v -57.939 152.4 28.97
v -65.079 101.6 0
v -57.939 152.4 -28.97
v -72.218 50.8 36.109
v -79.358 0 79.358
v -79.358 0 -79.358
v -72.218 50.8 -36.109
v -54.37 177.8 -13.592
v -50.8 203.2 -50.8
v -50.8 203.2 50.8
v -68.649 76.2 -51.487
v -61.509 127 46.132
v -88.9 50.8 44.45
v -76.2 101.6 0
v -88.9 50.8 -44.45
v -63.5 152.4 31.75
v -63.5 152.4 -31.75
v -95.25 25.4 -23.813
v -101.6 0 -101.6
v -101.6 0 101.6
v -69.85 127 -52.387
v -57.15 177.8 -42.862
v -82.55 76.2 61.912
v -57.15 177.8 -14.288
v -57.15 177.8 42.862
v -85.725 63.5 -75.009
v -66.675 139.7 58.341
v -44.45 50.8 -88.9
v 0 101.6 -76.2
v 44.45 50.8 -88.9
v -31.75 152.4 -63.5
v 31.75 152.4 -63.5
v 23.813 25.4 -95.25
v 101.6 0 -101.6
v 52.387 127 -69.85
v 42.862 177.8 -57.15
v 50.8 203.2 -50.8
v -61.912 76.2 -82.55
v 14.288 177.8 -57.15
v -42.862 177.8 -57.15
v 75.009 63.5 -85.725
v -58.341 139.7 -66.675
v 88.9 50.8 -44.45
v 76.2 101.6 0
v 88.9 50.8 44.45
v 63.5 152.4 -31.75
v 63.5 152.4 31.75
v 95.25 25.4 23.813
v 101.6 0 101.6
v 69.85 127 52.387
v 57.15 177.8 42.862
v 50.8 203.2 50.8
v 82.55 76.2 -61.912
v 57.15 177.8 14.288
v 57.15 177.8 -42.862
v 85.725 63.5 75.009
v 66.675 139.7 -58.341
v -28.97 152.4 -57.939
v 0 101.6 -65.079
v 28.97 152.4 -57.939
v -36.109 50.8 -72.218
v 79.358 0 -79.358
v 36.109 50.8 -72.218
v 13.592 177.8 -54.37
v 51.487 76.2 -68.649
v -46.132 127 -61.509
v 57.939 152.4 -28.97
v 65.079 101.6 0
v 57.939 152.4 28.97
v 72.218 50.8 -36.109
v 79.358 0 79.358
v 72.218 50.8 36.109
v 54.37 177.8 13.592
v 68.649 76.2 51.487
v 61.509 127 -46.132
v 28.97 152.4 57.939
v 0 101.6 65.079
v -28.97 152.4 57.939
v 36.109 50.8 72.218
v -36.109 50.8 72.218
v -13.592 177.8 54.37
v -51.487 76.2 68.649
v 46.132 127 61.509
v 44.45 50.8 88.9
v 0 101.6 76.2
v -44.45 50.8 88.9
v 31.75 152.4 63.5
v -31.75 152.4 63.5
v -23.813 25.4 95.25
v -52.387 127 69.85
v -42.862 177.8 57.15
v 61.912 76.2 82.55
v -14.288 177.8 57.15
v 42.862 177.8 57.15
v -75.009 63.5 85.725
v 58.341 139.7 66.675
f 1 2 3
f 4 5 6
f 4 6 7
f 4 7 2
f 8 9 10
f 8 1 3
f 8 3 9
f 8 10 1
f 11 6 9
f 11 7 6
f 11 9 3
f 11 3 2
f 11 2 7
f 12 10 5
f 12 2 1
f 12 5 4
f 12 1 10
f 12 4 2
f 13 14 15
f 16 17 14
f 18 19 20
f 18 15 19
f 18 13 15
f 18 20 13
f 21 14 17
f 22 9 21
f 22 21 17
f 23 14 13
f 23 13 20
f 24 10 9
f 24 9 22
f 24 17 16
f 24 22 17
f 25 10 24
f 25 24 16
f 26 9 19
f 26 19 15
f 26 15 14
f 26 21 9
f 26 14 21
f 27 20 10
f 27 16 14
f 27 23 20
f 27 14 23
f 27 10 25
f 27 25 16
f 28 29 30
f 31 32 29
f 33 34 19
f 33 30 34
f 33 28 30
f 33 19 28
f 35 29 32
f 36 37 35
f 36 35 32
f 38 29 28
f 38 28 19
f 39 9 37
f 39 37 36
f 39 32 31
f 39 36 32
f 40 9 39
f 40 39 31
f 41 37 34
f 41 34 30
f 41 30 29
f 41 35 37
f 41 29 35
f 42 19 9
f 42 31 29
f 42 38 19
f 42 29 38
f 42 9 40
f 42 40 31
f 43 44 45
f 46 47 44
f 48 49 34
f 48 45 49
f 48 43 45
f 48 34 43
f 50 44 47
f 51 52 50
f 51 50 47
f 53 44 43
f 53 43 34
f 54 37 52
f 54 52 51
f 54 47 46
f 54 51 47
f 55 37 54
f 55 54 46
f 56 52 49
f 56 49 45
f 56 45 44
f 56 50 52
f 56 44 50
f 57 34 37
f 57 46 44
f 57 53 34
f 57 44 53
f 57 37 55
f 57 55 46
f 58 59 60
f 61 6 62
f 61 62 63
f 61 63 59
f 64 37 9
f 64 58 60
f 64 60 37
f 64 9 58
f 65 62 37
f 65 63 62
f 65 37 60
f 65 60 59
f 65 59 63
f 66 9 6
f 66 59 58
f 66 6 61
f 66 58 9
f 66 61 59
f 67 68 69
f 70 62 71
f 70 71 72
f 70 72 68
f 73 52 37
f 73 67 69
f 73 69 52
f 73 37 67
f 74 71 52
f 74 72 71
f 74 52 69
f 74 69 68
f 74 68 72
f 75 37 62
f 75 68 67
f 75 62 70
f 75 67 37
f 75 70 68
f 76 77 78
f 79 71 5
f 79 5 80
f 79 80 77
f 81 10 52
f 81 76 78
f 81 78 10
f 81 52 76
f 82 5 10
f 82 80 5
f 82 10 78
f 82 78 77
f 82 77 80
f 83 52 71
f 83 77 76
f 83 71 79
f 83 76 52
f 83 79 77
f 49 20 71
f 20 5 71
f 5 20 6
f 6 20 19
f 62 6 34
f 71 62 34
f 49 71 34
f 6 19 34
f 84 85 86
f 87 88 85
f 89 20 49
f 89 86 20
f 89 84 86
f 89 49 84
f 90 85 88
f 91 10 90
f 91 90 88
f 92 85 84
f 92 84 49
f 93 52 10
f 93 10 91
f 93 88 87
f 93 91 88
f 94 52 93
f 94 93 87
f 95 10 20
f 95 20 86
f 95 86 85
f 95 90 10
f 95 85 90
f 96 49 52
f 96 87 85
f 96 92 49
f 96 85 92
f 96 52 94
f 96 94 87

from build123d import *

# Parameters (mm, degrees)
SKETCH1_W          = 203.2
SKETCH1_H          = 203.2
SKETCH2_W          = 101.6
SKETCH2_H          = 101.6
SKETCH14_W         = 101.6
SKETCH14_H         = 101.6
CUT_EXTRUDE2_DEPTH = 203.2
CUT_EXTRUDE2_TAPER = -8


with BuildPart() as part:
    # Sketch1 → Loft1 section 0
    with BuildSketch(Plane(origin=(0, 0, 0), x_dir=(1, 0, 0), z_dir=(0, 1, 0))):
        Rectangle(SKETCH1_W, SKETCH1_H)
    # Sketch2 → Loft1 section 1
    with BuildSketch(Plane(origin=(0, 203.2, 0), x_dir=(1, 0, 0), z_dir=(0, 1, 0))):
        Rectangle(SKETCH2_W, SKETCH2_H)
    loft()

    # Sketch14 → Cut-Extrude2 (cut)
    with BuildSketch(Plane(origin=(0, 203.2, 0), x_dir=(1, 0, 0), z_dir=(0, 1, 0))):
        Rectangle(SKETCH14_W, SKETCH14_H)
    extrude(amount=-CUT_EXTRUDE2_DEPTH, taper=CUT_EXTRUDE2_TAPER, mode=Mode.SUBTRACT)


solid = part.part
